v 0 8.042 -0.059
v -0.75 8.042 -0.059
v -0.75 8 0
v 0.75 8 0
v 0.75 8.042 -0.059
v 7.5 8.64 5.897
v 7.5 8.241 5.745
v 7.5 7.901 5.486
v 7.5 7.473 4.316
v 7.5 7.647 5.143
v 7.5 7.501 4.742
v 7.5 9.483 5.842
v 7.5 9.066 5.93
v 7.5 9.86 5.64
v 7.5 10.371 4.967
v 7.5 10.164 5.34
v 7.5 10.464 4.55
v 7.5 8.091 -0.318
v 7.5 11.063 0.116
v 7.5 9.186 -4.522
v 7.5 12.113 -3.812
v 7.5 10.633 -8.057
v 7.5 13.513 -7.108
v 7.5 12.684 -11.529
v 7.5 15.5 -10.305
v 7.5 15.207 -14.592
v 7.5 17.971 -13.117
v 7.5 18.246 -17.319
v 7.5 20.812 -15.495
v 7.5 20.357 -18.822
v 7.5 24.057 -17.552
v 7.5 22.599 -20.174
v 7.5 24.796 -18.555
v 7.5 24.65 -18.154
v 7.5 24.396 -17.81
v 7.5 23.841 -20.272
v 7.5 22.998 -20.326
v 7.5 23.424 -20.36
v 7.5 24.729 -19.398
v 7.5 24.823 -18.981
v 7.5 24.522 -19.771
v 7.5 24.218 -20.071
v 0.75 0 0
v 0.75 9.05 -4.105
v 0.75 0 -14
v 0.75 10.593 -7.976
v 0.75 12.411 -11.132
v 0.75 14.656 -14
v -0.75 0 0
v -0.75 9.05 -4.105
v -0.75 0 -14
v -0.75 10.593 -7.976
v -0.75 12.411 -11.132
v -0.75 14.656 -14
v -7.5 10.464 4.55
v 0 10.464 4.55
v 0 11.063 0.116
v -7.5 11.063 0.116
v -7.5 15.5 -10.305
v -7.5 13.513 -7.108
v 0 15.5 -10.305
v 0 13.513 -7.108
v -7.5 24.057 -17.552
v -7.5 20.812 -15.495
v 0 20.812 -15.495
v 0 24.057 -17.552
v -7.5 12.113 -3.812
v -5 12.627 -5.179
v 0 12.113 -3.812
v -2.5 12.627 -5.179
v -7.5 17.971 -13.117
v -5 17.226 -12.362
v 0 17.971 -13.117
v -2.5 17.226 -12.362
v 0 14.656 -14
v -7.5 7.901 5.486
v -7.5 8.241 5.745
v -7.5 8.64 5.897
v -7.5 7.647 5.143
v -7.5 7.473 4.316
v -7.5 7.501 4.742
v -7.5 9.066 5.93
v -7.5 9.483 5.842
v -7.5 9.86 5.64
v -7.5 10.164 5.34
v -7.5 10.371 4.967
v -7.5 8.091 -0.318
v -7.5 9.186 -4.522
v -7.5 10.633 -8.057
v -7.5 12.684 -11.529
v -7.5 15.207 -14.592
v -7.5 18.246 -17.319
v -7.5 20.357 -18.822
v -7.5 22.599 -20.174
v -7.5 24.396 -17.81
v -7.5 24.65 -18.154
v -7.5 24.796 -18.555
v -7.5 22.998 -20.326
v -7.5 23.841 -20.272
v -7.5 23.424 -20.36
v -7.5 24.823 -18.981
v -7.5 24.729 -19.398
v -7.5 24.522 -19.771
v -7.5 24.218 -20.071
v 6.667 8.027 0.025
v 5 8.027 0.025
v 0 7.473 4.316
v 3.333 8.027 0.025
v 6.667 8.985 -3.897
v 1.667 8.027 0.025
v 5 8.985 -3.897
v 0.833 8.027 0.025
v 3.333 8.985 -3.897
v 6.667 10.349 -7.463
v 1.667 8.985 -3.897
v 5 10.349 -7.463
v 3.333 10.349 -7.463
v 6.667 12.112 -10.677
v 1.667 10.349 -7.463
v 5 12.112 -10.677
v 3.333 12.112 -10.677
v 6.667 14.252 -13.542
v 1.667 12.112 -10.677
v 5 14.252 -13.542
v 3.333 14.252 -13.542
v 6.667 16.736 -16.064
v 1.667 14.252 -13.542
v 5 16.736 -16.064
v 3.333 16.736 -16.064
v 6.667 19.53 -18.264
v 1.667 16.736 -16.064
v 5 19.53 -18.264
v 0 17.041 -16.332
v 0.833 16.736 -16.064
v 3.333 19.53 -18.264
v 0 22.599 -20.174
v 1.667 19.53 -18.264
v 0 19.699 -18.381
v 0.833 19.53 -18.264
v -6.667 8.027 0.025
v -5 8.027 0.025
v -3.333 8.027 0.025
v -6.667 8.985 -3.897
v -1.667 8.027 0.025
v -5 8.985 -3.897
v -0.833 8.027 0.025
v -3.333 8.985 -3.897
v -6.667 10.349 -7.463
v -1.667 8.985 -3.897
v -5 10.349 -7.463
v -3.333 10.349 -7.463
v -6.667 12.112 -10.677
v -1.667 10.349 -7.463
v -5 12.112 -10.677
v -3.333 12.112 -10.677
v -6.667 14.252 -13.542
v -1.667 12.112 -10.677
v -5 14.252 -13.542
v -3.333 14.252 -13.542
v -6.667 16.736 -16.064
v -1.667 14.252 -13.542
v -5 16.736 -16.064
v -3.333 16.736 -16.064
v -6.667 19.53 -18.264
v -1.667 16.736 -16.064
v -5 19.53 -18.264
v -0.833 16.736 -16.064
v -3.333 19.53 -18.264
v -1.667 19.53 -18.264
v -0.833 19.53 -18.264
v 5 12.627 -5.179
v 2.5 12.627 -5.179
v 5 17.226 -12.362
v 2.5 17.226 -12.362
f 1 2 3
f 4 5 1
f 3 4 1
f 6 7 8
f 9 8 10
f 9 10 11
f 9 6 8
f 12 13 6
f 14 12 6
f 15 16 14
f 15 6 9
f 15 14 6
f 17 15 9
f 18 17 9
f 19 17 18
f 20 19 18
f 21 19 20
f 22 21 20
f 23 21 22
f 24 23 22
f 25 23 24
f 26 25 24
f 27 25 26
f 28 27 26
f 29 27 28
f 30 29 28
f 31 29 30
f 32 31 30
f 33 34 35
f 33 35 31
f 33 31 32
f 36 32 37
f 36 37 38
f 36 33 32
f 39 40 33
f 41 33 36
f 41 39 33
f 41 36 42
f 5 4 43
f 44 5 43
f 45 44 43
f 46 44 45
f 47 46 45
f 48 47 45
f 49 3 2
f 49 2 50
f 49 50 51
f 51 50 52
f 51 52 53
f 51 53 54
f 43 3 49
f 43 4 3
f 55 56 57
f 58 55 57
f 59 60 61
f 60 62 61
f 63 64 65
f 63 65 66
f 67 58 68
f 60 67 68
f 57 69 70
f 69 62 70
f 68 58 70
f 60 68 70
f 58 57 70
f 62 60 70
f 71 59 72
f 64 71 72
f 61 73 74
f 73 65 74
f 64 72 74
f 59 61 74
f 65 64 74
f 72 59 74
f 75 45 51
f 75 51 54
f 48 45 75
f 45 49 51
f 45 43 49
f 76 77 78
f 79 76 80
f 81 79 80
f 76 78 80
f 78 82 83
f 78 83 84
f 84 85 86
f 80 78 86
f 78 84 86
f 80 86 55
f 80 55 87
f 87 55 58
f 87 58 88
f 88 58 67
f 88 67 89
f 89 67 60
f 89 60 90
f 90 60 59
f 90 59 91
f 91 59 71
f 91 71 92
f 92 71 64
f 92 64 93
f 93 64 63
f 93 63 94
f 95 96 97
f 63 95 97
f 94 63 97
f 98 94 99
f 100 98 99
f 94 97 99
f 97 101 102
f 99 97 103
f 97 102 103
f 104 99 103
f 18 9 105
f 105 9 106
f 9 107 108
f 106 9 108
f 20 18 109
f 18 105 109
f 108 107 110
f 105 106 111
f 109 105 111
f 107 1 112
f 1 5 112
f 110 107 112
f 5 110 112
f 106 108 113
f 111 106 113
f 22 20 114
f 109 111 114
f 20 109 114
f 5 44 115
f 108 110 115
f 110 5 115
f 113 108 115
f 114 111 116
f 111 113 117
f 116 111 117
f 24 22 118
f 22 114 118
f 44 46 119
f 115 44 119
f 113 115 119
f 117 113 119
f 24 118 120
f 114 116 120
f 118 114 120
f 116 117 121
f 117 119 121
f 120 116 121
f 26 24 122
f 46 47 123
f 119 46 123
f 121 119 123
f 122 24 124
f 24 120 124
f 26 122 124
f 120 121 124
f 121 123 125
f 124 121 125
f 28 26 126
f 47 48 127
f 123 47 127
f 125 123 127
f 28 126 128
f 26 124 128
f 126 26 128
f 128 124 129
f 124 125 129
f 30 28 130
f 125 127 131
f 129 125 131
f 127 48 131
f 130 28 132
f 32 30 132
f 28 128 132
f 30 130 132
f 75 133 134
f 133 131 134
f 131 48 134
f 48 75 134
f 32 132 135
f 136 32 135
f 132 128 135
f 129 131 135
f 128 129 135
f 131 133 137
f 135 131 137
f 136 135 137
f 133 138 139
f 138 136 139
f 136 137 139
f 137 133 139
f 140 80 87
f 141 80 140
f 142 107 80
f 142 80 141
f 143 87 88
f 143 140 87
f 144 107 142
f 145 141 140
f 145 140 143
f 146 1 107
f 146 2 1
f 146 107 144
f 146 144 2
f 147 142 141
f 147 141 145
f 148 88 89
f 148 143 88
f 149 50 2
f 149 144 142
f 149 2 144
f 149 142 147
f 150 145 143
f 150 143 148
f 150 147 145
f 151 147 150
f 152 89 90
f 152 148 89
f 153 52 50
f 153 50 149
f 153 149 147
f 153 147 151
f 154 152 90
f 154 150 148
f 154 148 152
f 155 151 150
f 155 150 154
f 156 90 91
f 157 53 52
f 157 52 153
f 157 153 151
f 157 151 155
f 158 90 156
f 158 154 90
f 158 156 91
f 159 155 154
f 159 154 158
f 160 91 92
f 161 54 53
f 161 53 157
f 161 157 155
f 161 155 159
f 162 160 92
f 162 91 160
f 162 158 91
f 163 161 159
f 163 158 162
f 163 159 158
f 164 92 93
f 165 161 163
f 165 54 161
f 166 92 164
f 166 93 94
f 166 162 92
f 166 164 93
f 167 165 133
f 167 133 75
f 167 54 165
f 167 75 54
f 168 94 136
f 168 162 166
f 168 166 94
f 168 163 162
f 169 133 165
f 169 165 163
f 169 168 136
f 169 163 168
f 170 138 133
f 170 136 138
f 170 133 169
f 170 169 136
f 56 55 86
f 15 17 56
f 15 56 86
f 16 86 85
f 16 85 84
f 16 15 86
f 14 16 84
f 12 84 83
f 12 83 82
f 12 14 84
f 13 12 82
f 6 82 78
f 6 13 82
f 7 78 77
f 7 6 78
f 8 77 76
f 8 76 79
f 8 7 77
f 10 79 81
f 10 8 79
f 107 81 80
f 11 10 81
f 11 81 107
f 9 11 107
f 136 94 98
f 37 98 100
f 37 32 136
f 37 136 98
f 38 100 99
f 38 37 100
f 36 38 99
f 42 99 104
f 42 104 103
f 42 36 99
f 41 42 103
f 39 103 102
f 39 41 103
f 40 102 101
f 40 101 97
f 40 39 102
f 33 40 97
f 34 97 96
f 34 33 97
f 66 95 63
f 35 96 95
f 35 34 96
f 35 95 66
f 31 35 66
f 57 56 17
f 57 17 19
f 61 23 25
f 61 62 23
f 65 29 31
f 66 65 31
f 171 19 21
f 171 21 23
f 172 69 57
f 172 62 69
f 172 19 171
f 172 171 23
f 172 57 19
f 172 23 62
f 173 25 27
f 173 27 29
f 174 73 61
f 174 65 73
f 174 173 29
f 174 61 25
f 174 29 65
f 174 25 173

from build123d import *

# Parameters (mm, degrees)
BOSS_EXTRUDE1_DEPTH = 0.75
BOSS_EXTRUDE2_DEPTH = 7.5


with BuildPart() as part:
    # Sketch1 → Boss-Extrude1 (new, symmetric)
    with BuildSketch(Plane(origin=(0, 0, 0), x_dir=(0, 0, -1), z_dir=(1, 0, 0))):
        Polygon((0, 0), (14, 0), (14, 18), (0, 8), align=None)
    extrude(amount=BOSS_EXTRUDE1_DEPTH, both=True)

    # Sketch2 → Boss-Extrude2 (add, symmetric)
    with BuildSketch(Plane(origin=(0, 0, 0), x_dir=(0, 0, -1), z_dir=(1, 0, 0))):
        with BuildLine():
            ThreePointArc((-4.550304812, 10.464286171), (-5.928476621, 8.851635414), (-4.315825864, 7.473463604))
            add(Edge.make_bspline(
                [(-4.315825864, 7.473463604), (-3.583243131, 7.530897713), (-2.100585043, 7.6832237), (0.68576379, 8.118340384), (3.956902233, 8.917185571), (7.520727195, 10.282481231), (10.736128846, 12.048694485), (13.599295228, 14.193658518), (16.119096641, 16.686751031), (18.30906232, 19.477622478), (19.58868963, 21.545750976), (20.174187061, 22.599110502)],
                knots=[0, 0, 0, 0, 0.0625, 0.125, 0.25, 0.375, 0.5, 0.625, 0.75, 0.875, 1, 1, 1, 1], degree=3))
            ThreePointArc((20.174187061, 22.599110502), (19.591855999, 24.638936606), (17.552029895, 24.056605543))
            add(Edge.make_bspline(
                [(-4.550304812, 10.464286171), (6.637685906, 11.341418876), (13.172377699, 16.177239873), (17.552029895, 24.056605543)],
                knots=[0, 0, 0, 0, 1, 1, 1, 1], degree=3))
        make_face()
    extrude(amount=BOSS_EXTRUDE2_DEPTH, both=True)


solid = part.part
